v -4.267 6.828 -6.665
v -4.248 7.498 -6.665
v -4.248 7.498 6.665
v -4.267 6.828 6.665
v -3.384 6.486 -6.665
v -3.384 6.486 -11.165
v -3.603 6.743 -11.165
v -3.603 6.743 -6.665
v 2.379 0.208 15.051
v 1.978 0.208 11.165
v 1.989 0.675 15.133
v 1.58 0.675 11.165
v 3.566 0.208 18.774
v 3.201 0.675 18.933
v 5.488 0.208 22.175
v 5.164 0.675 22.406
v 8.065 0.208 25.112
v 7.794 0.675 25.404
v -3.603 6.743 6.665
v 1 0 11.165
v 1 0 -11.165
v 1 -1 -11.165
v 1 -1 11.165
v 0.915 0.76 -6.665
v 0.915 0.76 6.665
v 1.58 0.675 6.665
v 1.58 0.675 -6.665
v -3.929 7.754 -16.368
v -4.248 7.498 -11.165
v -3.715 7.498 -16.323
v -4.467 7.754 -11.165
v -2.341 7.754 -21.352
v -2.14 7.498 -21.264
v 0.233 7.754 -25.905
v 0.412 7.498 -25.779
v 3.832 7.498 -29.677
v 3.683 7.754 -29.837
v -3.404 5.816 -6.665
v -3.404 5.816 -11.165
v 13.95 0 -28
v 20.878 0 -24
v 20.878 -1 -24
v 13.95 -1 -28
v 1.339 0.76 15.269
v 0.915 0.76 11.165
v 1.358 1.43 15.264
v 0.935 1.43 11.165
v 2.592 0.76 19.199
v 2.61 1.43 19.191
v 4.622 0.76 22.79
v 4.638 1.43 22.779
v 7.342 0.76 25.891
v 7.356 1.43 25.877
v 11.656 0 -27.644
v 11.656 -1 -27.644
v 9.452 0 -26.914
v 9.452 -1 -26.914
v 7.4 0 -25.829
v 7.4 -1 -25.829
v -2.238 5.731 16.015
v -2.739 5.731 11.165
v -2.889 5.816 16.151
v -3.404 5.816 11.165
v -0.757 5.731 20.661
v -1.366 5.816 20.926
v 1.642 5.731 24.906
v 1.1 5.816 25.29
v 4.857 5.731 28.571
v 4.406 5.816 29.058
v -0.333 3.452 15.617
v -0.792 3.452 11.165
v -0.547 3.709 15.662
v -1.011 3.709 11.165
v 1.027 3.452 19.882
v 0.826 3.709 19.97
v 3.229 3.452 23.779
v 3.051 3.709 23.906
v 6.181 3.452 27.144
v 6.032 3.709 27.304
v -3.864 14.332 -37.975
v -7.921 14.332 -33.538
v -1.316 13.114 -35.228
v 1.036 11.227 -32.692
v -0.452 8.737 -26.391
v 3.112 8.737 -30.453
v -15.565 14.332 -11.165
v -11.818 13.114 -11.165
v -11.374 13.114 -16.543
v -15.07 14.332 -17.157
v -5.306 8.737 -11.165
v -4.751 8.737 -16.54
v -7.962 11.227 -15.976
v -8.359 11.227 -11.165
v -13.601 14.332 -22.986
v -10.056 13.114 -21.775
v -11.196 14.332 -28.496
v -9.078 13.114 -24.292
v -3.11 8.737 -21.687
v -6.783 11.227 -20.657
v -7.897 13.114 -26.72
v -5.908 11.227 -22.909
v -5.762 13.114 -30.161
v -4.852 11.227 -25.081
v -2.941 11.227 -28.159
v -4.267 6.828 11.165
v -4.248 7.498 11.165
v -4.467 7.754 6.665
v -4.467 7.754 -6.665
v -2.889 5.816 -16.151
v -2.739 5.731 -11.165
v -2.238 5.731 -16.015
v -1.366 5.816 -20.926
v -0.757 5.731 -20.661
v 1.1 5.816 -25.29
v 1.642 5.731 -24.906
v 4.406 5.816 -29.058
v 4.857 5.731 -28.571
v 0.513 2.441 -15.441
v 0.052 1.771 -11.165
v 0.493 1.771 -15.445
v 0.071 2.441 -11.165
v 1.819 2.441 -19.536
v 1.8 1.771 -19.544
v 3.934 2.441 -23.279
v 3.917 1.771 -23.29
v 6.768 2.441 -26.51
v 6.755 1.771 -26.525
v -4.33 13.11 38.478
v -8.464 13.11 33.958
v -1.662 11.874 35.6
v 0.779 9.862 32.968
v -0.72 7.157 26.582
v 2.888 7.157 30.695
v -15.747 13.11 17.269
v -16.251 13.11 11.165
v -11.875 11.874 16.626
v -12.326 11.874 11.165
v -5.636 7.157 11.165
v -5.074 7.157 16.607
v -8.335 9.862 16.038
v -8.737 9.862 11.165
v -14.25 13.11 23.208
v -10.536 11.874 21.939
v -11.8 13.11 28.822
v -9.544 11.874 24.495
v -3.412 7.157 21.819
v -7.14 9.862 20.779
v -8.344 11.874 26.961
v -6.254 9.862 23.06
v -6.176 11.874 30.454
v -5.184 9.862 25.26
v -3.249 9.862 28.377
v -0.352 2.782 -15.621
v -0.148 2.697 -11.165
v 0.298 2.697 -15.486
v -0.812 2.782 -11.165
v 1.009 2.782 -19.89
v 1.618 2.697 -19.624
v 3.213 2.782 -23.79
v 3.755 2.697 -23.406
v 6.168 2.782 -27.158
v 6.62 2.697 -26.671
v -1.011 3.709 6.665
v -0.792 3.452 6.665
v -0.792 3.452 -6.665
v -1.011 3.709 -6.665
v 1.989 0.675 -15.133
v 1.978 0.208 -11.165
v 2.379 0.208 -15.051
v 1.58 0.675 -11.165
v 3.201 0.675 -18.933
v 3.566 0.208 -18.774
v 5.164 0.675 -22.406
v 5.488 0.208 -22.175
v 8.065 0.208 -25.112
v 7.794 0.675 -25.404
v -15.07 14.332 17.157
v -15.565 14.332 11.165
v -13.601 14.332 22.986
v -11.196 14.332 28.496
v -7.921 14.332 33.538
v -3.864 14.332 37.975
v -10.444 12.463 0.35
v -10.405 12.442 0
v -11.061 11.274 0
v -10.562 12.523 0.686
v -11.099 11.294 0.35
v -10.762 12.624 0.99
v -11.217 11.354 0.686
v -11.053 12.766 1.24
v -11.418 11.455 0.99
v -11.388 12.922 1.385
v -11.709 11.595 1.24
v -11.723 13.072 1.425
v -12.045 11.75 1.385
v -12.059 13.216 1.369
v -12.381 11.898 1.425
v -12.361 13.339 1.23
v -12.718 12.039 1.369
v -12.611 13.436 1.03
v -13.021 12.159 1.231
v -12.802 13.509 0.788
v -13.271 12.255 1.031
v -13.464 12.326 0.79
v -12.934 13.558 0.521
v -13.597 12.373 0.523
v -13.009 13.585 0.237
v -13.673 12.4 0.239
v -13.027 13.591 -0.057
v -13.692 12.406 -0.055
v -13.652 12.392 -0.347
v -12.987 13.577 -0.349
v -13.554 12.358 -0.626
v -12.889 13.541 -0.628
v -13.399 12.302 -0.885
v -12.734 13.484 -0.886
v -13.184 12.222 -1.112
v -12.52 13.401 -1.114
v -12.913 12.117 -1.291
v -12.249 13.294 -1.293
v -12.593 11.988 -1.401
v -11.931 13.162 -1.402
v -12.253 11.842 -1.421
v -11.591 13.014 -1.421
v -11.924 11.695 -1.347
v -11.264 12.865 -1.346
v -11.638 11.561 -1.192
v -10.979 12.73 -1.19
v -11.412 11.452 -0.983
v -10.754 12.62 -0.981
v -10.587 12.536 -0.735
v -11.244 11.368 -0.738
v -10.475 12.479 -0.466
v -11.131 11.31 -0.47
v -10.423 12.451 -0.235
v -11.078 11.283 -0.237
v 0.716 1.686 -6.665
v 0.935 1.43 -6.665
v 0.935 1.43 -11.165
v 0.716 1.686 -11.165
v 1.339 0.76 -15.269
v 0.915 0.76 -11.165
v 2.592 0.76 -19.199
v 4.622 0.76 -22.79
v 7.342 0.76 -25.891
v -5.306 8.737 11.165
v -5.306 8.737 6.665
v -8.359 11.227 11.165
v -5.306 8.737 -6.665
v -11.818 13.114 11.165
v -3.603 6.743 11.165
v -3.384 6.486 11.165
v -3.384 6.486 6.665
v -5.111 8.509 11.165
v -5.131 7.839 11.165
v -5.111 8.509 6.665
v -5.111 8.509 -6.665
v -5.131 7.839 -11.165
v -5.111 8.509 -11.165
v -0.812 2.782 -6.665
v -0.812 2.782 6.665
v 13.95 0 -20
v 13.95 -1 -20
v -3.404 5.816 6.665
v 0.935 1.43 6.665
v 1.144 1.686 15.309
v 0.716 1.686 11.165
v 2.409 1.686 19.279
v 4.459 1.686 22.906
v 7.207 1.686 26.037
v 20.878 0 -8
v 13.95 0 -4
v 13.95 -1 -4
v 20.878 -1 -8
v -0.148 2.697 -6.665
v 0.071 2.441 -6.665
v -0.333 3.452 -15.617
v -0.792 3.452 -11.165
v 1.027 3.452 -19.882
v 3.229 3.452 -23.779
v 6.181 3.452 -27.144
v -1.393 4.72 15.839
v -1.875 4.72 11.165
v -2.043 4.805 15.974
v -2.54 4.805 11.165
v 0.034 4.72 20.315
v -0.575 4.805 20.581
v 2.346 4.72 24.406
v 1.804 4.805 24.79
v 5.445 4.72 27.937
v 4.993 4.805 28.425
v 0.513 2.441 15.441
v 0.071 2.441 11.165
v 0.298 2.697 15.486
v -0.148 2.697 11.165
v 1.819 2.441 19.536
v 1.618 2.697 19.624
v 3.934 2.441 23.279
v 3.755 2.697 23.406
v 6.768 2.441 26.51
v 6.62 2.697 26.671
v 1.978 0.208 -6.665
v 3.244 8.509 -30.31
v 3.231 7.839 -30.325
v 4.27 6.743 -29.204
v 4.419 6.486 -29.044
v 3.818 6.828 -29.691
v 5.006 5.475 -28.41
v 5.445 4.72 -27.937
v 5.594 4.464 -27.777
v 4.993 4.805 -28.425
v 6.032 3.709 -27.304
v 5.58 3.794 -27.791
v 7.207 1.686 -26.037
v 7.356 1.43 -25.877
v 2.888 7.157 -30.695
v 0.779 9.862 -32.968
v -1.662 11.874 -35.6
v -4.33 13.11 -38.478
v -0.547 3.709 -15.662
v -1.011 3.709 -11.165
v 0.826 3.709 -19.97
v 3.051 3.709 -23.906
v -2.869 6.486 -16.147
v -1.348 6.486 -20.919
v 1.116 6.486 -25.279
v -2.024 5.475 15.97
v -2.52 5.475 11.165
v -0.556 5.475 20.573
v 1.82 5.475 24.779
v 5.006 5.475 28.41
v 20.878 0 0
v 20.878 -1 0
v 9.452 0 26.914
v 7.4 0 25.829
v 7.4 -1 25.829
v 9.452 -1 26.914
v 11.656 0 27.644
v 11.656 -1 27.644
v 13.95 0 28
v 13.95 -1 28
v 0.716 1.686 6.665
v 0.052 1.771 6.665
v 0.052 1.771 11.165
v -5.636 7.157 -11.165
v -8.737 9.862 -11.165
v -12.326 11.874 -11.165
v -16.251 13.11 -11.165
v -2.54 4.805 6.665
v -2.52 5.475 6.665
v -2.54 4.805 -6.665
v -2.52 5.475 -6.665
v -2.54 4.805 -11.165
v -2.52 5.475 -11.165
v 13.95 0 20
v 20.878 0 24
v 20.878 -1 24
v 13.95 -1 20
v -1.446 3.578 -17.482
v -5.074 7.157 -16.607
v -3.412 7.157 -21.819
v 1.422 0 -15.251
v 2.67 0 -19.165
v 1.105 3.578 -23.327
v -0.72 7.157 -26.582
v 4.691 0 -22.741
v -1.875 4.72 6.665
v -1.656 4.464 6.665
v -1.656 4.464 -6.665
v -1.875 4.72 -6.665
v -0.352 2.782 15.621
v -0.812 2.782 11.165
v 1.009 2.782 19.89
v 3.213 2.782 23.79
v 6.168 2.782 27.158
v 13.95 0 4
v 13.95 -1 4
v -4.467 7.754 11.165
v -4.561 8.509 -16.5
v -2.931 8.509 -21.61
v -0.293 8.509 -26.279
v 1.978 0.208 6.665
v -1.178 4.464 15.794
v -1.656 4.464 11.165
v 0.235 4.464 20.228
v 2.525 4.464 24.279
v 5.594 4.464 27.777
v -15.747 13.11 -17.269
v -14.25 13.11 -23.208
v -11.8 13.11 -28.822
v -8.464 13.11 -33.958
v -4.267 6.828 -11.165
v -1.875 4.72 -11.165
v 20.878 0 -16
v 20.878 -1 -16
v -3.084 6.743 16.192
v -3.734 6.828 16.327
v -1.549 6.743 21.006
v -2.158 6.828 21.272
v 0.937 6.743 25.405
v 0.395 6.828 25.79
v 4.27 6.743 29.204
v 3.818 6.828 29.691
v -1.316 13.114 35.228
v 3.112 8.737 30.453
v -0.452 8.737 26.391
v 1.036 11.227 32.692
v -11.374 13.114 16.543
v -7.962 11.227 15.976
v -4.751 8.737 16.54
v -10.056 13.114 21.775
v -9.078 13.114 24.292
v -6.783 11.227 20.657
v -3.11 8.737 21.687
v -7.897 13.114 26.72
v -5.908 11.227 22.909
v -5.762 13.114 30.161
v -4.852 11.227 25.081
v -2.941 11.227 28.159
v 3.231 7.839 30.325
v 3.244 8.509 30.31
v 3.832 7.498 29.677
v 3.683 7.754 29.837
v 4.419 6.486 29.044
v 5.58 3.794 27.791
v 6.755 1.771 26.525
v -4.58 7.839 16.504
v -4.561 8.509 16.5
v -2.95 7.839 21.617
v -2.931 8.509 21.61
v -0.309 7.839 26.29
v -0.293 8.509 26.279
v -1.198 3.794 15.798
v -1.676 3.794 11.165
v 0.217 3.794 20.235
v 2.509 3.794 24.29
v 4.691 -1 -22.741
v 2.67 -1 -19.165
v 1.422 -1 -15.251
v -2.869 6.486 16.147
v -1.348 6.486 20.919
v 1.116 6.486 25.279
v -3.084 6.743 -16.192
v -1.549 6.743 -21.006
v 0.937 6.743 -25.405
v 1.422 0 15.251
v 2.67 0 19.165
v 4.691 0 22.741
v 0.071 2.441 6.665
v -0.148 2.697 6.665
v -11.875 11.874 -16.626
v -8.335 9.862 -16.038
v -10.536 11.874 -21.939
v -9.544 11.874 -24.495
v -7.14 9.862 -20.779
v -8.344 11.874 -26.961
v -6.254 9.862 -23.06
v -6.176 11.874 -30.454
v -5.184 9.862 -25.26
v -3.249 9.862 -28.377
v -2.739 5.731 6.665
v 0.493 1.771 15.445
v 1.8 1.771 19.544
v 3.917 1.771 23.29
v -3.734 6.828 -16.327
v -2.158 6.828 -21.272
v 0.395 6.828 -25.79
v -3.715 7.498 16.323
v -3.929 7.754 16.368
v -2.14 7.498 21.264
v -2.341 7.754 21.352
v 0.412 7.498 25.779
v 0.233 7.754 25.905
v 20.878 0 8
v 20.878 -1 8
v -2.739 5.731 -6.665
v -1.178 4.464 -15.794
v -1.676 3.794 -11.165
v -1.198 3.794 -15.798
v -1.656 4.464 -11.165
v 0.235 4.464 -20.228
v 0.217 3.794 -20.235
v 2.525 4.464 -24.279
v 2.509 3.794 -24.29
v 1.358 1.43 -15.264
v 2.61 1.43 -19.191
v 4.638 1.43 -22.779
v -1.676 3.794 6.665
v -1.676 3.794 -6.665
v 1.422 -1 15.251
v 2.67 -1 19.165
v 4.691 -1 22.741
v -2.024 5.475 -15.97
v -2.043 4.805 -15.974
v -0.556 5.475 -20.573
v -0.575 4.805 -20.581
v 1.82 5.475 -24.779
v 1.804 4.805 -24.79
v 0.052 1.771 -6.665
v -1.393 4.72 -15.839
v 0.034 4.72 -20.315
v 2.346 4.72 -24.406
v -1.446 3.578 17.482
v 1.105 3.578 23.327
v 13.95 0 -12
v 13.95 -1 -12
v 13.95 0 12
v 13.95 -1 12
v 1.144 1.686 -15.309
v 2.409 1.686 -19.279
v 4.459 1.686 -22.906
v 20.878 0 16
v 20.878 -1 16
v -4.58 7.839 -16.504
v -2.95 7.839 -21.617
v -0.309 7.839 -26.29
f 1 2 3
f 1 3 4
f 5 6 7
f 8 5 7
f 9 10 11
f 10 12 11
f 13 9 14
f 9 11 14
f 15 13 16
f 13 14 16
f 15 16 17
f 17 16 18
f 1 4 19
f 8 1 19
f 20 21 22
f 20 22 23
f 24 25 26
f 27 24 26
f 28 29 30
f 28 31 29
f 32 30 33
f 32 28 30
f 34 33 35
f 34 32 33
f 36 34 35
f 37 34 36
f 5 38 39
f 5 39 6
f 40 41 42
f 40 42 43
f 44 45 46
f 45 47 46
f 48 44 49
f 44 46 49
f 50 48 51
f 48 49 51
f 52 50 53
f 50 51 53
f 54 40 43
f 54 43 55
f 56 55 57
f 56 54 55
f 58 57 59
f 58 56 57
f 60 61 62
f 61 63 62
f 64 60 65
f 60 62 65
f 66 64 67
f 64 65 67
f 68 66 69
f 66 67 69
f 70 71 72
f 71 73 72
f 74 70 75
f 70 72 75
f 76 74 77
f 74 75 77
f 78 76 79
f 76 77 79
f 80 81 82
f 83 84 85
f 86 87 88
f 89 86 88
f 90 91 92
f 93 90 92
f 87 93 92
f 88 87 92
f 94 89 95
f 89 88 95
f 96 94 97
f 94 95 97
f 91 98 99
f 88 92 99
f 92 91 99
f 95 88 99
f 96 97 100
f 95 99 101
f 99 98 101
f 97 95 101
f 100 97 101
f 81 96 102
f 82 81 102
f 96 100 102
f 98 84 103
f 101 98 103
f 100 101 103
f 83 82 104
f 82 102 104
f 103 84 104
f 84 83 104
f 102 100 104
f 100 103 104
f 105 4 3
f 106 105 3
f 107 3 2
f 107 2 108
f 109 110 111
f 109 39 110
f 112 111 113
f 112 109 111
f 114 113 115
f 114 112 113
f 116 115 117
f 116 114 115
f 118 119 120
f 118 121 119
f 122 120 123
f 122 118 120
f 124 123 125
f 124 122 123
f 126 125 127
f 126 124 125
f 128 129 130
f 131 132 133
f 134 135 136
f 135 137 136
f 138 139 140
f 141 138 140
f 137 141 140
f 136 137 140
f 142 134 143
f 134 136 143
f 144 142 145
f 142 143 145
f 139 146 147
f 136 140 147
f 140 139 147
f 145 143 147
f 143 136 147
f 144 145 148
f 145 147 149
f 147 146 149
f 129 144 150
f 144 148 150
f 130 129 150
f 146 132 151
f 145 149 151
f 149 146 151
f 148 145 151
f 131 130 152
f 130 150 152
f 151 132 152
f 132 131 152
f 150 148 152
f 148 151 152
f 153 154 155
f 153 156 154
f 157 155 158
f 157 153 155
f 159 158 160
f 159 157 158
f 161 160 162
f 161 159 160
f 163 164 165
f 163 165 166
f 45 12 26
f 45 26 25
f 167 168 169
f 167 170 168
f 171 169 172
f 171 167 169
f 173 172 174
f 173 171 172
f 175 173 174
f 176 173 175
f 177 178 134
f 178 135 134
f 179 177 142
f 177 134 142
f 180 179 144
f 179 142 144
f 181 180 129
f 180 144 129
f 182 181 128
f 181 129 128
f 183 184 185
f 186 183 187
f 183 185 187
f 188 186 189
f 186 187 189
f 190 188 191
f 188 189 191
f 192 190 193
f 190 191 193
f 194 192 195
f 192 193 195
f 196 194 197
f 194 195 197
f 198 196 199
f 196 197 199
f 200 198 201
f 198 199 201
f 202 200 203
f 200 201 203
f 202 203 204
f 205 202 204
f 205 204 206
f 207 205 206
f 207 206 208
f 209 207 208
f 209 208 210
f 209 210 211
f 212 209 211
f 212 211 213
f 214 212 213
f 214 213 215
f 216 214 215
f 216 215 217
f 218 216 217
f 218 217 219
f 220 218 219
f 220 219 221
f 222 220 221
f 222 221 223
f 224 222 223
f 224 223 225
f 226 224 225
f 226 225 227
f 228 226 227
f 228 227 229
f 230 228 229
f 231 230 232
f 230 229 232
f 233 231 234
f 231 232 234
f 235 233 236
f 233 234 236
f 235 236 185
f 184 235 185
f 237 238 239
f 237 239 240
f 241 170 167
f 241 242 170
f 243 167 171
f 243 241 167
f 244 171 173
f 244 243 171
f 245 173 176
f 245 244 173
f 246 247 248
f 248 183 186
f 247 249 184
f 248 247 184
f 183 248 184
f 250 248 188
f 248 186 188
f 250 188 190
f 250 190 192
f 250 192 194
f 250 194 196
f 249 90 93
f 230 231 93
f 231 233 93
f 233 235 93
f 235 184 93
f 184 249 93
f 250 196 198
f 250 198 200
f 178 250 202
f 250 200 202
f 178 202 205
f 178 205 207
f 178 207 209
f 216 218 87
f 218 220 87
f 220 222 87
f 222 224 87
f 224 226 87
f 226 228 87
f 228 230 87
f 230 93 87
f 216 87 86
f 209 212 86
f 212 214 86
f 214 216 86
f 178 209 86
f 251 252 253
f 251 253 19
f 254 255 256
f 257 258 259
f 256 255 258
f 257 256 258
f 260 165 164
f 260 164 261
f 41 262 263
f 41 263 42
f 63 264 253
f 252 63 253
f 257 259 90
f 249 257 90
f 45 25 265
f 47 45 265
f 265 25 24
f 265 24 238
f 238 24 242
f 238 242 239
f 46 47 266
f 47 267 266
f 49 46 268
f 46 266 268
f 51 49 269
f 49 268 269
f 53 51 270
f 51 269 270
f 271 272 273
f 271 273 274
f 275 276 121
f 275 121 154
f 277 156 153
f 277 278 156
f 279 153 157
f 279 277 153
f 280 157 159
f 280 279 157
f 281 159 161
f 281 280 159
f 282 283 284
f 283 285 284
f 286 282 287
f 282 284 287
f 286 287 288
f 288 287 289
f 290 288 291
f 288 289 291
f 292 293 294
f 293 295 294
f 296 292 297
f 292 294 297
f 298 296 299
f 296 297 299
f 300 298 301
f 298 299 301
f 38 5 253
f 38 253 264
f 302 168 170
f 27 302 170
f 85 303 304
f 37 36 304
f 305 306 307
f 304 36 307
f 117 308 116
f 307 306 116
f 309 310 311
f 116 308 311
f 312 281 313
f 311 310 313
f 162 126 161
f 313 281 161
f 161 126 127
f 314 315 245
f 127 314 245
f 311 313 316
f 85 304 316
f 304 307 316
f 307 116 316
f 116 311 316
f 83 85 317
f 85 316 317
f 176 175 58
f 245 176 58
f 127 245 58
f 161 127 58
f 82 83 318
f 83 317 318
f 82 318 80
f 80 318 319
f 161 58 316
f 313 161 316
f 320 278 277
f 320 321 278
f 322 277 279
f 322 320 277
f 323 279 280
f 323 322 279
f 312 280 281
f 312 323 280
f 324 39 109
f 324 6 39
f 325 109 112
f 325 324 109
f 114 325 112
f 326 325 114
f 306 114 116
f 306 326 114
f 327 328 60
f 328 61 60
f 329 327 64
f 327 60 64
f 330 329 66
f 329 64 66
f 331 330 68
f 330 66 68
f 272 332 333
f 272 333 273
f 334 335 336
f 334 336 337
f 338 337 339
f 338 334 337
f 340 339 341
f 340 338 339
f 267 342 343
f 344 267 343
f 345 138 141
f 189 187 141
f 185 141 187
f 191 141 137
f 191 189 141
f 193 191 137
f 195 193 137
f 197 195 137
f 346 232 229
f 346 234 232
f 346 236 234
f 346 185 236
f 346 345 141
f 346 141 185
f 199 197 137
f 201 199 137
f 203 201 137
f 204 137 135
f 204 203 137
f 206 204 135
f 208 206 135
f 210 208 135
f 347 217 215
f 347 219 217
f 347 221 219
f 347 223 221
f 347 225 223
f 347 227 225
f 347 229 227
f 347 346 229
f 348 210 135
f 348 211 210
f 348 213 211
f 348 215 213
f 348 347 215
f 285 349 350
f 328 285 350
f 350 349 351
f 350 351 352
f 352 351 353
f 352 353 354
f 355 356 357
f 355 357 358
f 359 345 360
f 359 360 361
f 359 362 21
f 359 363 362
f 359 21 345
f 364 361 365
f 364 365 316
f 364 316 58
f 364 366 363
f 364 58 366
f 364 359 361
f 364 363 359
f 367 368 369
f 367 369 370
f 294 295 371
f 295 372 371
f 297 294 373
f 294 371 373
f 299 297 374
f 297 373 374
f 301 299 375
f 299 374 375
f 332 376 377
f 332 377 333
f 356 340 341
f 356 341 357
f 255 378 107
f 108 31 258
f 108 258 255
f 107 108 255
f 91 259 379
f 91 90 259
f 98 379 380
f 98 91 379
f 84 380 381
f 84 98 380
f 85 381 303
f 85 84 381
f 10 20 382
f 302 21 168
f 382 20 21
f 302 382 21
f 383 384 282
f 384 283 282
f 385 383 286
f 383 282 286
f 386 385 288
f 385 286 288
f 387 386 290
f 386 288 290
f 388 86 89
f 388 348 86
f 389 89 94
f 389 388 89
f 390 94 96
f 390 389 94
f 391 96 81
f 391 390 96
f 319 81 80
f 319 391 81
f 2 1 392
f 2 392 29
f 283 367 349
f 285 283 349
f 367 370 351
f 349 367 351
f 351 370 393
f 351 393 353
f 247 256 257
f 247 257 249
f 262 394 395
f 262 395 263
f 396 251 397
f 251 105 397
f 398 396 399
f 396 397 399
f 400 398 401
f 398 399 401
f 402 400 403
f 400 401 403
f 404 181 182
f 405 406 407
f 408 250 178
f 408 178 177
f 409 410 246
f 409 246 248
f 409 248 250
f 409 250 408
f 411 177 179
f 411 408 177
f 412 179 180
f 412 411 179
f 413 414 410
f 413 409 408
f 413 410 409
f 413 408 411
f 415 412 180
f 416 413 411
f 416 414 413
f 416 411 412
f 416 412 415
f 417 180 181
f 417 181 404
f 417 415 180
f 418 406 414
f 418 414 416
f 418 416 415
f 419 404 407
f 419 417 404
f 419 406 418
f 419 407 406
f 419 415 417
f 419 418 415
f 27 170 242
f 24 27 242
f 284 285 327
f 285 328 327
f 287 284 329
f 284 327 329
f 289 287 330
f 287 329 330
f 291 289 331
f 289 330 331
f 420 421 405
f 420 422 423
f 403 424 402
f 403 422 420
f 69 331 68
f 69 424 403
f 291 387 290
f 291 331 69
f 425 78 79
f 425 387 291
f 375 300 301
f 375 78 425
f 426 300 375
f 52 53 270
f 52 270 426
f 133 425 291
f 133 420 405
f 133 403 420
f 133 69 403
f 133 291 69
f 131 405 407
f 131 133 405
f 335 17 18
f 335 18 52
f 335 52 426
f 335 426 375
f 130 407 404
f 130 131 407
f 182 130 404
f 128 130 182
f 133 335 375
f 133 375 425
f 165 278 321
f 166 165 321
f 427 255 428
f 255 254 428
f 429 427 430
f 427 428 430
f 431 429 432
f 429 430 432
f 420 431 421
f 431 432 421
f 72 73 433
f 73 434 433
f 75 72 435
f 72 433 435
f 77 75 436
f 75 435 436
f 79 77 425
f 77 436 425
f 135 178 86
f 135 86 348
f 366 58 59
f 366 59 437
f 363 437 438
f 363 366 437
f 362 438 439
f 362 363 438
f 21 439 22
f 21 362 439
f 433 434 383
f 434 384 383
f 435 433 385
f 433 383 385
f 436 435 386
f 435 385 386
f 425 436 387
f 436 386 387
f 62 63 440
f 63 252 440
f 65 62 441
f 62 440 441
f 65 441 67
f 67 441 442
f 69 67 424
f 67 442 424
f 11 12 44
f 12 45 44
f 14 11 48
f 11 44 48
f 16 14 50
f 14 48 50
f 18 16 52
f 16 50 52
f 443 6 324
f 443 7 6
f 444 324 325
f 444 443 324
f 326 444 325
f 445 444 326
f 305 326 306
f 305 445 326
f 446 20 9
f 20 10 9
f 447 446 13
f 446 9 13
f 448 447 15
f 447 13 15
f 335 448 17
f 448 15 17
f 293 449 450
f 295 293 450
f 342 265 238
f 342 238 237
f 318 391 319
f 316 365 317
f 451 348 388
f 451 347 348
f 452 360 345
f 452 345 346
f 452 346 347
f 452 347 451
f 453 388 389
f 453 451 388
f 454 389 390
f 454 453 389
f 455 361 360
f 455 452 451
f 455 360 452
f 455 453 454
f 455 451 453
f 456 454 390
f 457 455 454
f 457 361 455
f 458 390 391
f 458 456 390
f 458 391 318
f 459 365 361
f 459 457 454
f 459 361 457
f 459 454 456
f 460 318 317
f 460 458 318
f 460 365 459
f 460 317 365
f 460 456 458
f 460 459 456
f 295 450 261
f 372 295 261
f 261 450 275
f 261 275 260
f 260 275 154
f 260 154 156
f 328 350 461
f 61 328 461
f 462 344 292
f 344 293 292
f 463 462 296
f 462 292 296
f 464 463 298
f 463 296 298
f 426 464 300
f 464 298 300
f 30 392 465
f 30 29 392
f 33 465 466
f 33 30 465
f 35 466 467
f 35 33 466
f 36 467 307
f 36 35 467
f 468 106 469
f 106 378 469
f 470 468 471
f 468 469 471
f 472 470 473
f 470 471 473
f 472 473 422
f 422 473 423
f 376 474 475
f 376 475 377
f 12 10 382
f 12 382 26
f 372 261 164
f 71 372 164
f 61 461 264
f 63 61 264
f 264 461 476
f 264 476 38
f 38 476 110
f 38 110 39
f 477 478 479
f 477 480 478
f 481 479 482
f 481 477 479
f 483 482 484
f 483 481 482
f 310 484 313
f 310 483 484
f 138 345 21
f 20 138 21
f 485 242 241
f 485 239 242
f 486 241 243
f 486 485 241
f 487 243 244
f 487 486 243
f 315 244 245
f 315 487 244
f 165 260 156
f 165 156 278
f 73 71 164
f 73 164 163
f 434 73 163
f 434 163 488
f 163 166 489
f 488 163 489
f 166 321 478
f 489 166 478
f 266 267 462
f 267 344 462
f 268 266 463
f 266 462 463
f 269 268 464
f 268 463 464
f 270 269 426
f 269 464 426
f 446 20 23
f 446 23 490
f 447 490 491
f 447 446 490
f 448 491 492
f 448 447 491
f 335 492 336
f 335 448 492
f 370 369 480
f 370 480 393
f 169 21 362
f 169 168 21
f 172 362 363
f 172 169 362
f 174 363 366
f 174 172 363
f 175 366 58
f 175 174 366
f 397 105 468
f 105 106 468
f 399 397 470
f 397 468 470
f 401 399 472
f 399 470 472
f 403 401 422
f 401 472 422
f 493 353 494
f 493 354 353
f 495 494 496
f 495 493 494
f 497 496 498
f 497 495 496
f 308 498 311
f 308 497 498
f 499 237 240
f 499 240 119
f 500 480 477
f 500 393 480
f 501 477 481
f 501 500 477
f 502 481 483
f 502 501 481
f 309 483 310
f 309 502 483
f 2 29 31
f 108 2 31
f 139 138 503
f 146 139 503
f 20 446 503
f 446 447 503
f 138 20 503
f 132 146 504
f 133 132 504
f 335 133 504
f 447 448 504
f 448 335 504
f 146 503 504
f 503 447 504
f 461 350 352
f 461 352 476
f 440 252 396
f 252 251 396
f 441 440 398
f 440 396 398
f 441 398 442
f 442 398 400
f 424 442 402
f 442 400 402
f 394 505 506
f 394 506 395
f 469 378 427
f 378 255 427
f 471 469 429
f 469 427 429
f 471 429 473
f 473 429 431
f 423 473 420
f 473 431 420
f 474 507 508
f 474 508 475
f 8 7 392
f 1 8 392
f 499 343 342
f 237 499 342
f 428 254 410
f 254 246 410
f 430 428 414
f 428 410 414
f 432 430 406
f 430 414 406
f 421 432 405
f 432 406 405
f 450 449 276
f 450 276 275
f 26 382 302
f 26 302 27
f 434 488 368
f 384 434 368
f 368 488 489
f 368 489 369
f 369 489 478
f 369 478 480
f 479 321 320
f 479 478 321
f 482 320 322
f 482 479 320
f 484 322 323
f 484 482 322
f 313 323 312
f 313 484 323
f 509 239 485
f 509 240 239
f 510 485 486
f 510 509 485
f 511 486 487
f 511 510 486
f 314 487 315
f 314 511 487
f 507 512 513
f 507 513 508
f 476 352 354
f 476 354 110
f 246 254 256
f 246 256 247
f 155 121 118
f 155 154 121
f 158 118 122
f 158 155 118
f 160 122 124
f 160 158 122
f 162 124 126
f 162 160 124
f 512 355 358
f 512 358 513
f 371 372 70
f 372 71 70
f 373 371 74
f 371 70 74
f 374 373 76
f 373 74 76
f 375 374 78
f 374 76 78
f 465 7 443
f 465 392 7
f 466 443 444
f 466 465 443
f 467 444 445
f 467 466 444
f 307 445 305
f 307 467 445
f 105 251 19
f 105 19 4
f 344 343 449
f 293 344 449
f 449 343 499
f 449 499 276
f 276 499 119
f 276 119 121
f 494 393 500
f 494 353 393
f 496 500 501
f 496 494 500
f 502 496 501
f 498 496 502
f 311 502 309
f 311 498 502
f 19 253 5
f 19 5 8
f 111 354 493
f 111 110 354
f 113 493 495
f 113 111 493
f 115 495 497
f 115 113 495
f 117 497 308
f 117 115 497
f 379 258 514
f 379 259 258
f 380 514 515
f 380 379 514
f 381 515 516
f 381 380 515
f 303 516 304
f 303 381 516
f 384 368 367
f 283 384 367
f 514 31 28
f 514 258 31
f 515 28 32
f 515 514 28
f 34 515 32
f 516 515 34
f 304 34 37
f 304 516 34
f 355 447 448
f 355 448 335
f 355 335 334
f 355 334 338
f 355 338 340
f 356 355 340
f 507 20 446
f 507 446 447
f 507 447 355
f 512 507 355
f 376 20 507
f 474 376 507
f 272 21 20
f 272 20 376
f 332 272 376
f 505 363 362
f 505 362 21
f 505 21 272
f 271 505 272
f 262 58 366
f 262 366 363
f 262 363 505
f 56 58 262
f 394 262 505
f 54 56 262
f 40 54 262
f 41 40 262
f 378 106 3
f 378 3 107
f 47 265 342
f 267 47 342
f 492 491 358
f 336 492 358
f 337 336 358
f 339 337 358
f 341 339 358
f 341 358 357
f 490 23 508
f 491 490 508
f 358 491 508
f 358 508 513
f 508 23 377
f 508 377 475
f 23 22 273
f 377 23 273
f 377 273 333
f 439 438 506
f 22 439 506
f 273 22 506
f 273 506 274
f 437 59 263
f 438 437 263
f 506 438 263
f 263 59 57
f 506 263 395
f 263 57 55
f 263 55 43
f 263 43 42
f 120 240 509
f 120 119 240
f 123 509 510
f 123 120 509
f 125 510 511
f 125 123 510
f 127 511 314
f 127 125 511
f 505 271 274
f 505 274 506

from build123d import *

# Parameters (mm, degrees)
BOSS_EXTRUDE1_DEPTH = 6.665
CUT_EXTRUDE2_DEPTH  = 26.439635203
LPATTERN1_COUNT     = 8
LPATTERN1_PITCH     = 1.33
BOSS_EXTRUDE2_DEPTH = 1
SKETCH12_R          = 1.425
CUT_EXTRUDE4_DEPTH  = 68.19127885


with BuildPart() as part:
    # Sketch1 → Boss-Extrude1 (new, symmetric)
    with BuildSketch(Plane.XY):
        with BuildLine():
            Line((-5.635928665, 7.156958206), (1, 0))
            Line((1, 0), (1.978038604, 0.208423819))
            Line((1.978038604, 0.208423819), (-5.306204433, 8.736958206))
            ThreePointArc((-5.306204433, 8.736958206), (-10.044936575, 12.250309514), (-15.564524684, 14.33198356))
            Line((-15.564524684, 14.33198356), (-16.250550344, 13.11))
            ThreePointArc((-16.250550344, 13.11), (-10.479442469, 10.960456342), (-5.635928665, 7.156958206))
        make_face()
    extrude(amount=BOSS_EXTRUDE1_DEPTH, both=True)

    # Sketch2 → Cut-Extrude2 (cut, symmetric)
    with BuildSketch(Plane.XY.offset(6.665)):
        Polygon((-3.982294286, 46.704559607), (-5.111367134, 8.50883888), (-5.131163815, 7.839131413), (-4.46660252, 7.753935845), (33.435614326, 2.894939498), (91.54886787, 52.52961802), (54.130959258, 96.339238129), align=None)
    cut_extrude2 = extrude(amount=CUT_EXTRUDE2_DEPTH, both=True, mode=Mode.SUBTRACT)

    # LPattern1: Cut-Extrude2 ×8
    with Locations(*[Vector(0.6494576652092012, -0.7603977519042342, 0) * (i * LPATTERN1_PITCH) for i in range(1, LPATTERN1_COUNT)]):
        add(cut_extrude2, mode=Mode.SUBTRACT)

    # Sweep1: sweep along a path in Sketch5
    with BuildLine(Plane(origin=(0, 0, 0), x_dir=(1, 0, 0), z_dir=(0, 1, 0))) as sweep1_path:
        Line((1, -6.665), (1, -11.165))
        ThreePointArc((1, -11.165), (2.66969722, -19.165), (7.4, -25.829242224))
    # Sketch3 → Sweep1 (sweep)
    with BuildSketch(Plane.XY.offset(6.665)):
        with BuildLine():
            Line((-5.111367134, 8.50883888), (-5.306204433, 8.736958206))
            ThreePointArc((-5.306204433, 8.736958206), (-10.044936575, 12.250309514), (-15.564524684, 14.33198356))
            Line((-15.564524684, 14.33198356), (-16.250550344, 13.11))
            ThreePointArc((-16.250550344, 13.11), (-10.479442469, 10.960456342), (-5.635928665, 7.156958206))
            Line((-5.635928665, 7.156958206), (1, 0))
            Line((1, 0), (1.978038604, 0.208423819))
            Line((1.978038604, 0.208423819), (1.579848343, 0.674632774))
            Line((1.579848343, 0.674632774), (0.915287048, 0.759828343))
            Line((0.915287048, 0.759828343), (0.935083729, 1.42953581))
            Line((0.935083729, 1.42953581), (0.716069648, 1.685961784))
            Line((0.716069648, 1.685961784), (0.051508353, 1.771157353))
            Line((0.051508353, 1.771157353), (0.071305034, 2.44086482))
            Line((0.071305034, 2.44086482), (-0.147709047, 2.697290795))
            Line((-0.147709047, 2.697290795), (-0.812270342, 2.782486363))
            Line((-0.812270342, 2.782486363), (-0.79247366, 3.45219383))
            Line((-0.79247366, 3.45219383), (-1.011487741, 3.708619805))
            Line((-1.011487741, 3.708619805), (-1.676049036, 3.793815373))
            Line((-1.676049036, 3.793815373), (-1.656252355, 4.46352284))
            Line((-1.656252355, 4.46352284), (-1.875266436, 4.719948815))
            Line((-1.875266436, 4.719948815), (-2.539827731, 4.805144383))
            Line((-2.539827731, 4.805144383), (-2.52003105, 5.47485185))
            Line((-2.52003105, 5.47485185), (-2.739045131, 5.731277825))
            Line((-2.739045131, 5.731277825), (-3.403606426, 5.816473393))
            Line((-3.403606426, 5.816473393), (-3.383809744, 6.48618086))
            Line((-3.383809744, 6.48618086), (-3.602823825, 6.742606835))
            Line((-3.602823825, 6.742606835), (-4.267385121, 6.827802403))
            Line((-4.267385121, 6.827802403), (-4.247588439, 7.49750987))
            Line((-4.247588439, 7.49750987), (-4.46660252, 7.753935845))
            Line((-4.46660252, 7.753935845), (-5.131163815, 7.839131413))
            Line((-5.131163815, 7.839131413), (-5.111367134, 8.50883888))
        make_face()
    sweep1 = sweep(path=sweep1_path.line)

    # Mirror1: Sweep1 across plane
    add(sweep1.mirror(Plane.XY))

    # Sketch12 → Cut-Extrude4 (cut, through all)
    with BuildSketch(Plane(origin=(-25.092317038, 18.067298753, 6.665), x_dir=(-0.8722573757239733, 0.4890471045769798, 0), z_dir=(-0.4890471045769798, -0.8722573757239733, 0))):
        with Locations(Location((-14.136648815, 6.665, 0), (0, 0, 180))):
            Circle(SKETCH12_R)
    extrude(amount=-CUT_EXTRUDE4_DEPTH, mode=Mode.SUBTRACT)


with BuildPart() as body_2:
    # Sketch9 → Boss-Extrude2 (new body)
    with BuildSketch(Plane(origin=(0, 0, 0), x_dir=(1, 0, 0), z_dir=(0, 1, 0))):
        with BuildLine():
            Line((13.949642027, 20), (20.877845257, 24))
            Line((20.877845257, 24), (13.949642027, 28))
            ThreePointArc((13.949642027, 28), (10.538992417, 27.324445134), (7.4, 25.829242224))
            ThreePointArc((7.4, 25.829242224), (2.66969722, 19.165), (1, 11.165))
            Line((1, 11.165), (1, -11.165))
            ThreePointArc((1, -11.165), (2.66969722, -19.165), (7.4, -25.829242224))
            ThreePointArc((7.4, -25.829242224), (10.538992417, -27.324445134), (13.949642027, -28))
            Line((13.949642027, -28), (20.877845257, -24))
            Line((20.877845257, -24), (13.949642027, -20))
            Line((13.949642027, -20), (20.877845257, -16))
            Line((20.877845257, -16), (13.949642027, -12))
            Line((13.949642027, -12), (20.877845257, -8))
            Line((20.877845257, -8), (13.949642027, -4))
            Line((13.949642027, -4), (20.877845257, 0))
            Line((20.877845257, 0), (13.949642027, 4))
            Line((13.949642027, 4), (20.877845257, 8))
            Line((20.877845257, 8), (13.949642027, 12))
            Line((13.949642027, 12), (20.877845257, 16))
            Line((20.877845257, 16), (13.949642027, 20))
        make_face()
    extrude(amount=-BOSS_EXTRUDE2_DEPTH)


solid = Compound([part.part, body_2.part])
